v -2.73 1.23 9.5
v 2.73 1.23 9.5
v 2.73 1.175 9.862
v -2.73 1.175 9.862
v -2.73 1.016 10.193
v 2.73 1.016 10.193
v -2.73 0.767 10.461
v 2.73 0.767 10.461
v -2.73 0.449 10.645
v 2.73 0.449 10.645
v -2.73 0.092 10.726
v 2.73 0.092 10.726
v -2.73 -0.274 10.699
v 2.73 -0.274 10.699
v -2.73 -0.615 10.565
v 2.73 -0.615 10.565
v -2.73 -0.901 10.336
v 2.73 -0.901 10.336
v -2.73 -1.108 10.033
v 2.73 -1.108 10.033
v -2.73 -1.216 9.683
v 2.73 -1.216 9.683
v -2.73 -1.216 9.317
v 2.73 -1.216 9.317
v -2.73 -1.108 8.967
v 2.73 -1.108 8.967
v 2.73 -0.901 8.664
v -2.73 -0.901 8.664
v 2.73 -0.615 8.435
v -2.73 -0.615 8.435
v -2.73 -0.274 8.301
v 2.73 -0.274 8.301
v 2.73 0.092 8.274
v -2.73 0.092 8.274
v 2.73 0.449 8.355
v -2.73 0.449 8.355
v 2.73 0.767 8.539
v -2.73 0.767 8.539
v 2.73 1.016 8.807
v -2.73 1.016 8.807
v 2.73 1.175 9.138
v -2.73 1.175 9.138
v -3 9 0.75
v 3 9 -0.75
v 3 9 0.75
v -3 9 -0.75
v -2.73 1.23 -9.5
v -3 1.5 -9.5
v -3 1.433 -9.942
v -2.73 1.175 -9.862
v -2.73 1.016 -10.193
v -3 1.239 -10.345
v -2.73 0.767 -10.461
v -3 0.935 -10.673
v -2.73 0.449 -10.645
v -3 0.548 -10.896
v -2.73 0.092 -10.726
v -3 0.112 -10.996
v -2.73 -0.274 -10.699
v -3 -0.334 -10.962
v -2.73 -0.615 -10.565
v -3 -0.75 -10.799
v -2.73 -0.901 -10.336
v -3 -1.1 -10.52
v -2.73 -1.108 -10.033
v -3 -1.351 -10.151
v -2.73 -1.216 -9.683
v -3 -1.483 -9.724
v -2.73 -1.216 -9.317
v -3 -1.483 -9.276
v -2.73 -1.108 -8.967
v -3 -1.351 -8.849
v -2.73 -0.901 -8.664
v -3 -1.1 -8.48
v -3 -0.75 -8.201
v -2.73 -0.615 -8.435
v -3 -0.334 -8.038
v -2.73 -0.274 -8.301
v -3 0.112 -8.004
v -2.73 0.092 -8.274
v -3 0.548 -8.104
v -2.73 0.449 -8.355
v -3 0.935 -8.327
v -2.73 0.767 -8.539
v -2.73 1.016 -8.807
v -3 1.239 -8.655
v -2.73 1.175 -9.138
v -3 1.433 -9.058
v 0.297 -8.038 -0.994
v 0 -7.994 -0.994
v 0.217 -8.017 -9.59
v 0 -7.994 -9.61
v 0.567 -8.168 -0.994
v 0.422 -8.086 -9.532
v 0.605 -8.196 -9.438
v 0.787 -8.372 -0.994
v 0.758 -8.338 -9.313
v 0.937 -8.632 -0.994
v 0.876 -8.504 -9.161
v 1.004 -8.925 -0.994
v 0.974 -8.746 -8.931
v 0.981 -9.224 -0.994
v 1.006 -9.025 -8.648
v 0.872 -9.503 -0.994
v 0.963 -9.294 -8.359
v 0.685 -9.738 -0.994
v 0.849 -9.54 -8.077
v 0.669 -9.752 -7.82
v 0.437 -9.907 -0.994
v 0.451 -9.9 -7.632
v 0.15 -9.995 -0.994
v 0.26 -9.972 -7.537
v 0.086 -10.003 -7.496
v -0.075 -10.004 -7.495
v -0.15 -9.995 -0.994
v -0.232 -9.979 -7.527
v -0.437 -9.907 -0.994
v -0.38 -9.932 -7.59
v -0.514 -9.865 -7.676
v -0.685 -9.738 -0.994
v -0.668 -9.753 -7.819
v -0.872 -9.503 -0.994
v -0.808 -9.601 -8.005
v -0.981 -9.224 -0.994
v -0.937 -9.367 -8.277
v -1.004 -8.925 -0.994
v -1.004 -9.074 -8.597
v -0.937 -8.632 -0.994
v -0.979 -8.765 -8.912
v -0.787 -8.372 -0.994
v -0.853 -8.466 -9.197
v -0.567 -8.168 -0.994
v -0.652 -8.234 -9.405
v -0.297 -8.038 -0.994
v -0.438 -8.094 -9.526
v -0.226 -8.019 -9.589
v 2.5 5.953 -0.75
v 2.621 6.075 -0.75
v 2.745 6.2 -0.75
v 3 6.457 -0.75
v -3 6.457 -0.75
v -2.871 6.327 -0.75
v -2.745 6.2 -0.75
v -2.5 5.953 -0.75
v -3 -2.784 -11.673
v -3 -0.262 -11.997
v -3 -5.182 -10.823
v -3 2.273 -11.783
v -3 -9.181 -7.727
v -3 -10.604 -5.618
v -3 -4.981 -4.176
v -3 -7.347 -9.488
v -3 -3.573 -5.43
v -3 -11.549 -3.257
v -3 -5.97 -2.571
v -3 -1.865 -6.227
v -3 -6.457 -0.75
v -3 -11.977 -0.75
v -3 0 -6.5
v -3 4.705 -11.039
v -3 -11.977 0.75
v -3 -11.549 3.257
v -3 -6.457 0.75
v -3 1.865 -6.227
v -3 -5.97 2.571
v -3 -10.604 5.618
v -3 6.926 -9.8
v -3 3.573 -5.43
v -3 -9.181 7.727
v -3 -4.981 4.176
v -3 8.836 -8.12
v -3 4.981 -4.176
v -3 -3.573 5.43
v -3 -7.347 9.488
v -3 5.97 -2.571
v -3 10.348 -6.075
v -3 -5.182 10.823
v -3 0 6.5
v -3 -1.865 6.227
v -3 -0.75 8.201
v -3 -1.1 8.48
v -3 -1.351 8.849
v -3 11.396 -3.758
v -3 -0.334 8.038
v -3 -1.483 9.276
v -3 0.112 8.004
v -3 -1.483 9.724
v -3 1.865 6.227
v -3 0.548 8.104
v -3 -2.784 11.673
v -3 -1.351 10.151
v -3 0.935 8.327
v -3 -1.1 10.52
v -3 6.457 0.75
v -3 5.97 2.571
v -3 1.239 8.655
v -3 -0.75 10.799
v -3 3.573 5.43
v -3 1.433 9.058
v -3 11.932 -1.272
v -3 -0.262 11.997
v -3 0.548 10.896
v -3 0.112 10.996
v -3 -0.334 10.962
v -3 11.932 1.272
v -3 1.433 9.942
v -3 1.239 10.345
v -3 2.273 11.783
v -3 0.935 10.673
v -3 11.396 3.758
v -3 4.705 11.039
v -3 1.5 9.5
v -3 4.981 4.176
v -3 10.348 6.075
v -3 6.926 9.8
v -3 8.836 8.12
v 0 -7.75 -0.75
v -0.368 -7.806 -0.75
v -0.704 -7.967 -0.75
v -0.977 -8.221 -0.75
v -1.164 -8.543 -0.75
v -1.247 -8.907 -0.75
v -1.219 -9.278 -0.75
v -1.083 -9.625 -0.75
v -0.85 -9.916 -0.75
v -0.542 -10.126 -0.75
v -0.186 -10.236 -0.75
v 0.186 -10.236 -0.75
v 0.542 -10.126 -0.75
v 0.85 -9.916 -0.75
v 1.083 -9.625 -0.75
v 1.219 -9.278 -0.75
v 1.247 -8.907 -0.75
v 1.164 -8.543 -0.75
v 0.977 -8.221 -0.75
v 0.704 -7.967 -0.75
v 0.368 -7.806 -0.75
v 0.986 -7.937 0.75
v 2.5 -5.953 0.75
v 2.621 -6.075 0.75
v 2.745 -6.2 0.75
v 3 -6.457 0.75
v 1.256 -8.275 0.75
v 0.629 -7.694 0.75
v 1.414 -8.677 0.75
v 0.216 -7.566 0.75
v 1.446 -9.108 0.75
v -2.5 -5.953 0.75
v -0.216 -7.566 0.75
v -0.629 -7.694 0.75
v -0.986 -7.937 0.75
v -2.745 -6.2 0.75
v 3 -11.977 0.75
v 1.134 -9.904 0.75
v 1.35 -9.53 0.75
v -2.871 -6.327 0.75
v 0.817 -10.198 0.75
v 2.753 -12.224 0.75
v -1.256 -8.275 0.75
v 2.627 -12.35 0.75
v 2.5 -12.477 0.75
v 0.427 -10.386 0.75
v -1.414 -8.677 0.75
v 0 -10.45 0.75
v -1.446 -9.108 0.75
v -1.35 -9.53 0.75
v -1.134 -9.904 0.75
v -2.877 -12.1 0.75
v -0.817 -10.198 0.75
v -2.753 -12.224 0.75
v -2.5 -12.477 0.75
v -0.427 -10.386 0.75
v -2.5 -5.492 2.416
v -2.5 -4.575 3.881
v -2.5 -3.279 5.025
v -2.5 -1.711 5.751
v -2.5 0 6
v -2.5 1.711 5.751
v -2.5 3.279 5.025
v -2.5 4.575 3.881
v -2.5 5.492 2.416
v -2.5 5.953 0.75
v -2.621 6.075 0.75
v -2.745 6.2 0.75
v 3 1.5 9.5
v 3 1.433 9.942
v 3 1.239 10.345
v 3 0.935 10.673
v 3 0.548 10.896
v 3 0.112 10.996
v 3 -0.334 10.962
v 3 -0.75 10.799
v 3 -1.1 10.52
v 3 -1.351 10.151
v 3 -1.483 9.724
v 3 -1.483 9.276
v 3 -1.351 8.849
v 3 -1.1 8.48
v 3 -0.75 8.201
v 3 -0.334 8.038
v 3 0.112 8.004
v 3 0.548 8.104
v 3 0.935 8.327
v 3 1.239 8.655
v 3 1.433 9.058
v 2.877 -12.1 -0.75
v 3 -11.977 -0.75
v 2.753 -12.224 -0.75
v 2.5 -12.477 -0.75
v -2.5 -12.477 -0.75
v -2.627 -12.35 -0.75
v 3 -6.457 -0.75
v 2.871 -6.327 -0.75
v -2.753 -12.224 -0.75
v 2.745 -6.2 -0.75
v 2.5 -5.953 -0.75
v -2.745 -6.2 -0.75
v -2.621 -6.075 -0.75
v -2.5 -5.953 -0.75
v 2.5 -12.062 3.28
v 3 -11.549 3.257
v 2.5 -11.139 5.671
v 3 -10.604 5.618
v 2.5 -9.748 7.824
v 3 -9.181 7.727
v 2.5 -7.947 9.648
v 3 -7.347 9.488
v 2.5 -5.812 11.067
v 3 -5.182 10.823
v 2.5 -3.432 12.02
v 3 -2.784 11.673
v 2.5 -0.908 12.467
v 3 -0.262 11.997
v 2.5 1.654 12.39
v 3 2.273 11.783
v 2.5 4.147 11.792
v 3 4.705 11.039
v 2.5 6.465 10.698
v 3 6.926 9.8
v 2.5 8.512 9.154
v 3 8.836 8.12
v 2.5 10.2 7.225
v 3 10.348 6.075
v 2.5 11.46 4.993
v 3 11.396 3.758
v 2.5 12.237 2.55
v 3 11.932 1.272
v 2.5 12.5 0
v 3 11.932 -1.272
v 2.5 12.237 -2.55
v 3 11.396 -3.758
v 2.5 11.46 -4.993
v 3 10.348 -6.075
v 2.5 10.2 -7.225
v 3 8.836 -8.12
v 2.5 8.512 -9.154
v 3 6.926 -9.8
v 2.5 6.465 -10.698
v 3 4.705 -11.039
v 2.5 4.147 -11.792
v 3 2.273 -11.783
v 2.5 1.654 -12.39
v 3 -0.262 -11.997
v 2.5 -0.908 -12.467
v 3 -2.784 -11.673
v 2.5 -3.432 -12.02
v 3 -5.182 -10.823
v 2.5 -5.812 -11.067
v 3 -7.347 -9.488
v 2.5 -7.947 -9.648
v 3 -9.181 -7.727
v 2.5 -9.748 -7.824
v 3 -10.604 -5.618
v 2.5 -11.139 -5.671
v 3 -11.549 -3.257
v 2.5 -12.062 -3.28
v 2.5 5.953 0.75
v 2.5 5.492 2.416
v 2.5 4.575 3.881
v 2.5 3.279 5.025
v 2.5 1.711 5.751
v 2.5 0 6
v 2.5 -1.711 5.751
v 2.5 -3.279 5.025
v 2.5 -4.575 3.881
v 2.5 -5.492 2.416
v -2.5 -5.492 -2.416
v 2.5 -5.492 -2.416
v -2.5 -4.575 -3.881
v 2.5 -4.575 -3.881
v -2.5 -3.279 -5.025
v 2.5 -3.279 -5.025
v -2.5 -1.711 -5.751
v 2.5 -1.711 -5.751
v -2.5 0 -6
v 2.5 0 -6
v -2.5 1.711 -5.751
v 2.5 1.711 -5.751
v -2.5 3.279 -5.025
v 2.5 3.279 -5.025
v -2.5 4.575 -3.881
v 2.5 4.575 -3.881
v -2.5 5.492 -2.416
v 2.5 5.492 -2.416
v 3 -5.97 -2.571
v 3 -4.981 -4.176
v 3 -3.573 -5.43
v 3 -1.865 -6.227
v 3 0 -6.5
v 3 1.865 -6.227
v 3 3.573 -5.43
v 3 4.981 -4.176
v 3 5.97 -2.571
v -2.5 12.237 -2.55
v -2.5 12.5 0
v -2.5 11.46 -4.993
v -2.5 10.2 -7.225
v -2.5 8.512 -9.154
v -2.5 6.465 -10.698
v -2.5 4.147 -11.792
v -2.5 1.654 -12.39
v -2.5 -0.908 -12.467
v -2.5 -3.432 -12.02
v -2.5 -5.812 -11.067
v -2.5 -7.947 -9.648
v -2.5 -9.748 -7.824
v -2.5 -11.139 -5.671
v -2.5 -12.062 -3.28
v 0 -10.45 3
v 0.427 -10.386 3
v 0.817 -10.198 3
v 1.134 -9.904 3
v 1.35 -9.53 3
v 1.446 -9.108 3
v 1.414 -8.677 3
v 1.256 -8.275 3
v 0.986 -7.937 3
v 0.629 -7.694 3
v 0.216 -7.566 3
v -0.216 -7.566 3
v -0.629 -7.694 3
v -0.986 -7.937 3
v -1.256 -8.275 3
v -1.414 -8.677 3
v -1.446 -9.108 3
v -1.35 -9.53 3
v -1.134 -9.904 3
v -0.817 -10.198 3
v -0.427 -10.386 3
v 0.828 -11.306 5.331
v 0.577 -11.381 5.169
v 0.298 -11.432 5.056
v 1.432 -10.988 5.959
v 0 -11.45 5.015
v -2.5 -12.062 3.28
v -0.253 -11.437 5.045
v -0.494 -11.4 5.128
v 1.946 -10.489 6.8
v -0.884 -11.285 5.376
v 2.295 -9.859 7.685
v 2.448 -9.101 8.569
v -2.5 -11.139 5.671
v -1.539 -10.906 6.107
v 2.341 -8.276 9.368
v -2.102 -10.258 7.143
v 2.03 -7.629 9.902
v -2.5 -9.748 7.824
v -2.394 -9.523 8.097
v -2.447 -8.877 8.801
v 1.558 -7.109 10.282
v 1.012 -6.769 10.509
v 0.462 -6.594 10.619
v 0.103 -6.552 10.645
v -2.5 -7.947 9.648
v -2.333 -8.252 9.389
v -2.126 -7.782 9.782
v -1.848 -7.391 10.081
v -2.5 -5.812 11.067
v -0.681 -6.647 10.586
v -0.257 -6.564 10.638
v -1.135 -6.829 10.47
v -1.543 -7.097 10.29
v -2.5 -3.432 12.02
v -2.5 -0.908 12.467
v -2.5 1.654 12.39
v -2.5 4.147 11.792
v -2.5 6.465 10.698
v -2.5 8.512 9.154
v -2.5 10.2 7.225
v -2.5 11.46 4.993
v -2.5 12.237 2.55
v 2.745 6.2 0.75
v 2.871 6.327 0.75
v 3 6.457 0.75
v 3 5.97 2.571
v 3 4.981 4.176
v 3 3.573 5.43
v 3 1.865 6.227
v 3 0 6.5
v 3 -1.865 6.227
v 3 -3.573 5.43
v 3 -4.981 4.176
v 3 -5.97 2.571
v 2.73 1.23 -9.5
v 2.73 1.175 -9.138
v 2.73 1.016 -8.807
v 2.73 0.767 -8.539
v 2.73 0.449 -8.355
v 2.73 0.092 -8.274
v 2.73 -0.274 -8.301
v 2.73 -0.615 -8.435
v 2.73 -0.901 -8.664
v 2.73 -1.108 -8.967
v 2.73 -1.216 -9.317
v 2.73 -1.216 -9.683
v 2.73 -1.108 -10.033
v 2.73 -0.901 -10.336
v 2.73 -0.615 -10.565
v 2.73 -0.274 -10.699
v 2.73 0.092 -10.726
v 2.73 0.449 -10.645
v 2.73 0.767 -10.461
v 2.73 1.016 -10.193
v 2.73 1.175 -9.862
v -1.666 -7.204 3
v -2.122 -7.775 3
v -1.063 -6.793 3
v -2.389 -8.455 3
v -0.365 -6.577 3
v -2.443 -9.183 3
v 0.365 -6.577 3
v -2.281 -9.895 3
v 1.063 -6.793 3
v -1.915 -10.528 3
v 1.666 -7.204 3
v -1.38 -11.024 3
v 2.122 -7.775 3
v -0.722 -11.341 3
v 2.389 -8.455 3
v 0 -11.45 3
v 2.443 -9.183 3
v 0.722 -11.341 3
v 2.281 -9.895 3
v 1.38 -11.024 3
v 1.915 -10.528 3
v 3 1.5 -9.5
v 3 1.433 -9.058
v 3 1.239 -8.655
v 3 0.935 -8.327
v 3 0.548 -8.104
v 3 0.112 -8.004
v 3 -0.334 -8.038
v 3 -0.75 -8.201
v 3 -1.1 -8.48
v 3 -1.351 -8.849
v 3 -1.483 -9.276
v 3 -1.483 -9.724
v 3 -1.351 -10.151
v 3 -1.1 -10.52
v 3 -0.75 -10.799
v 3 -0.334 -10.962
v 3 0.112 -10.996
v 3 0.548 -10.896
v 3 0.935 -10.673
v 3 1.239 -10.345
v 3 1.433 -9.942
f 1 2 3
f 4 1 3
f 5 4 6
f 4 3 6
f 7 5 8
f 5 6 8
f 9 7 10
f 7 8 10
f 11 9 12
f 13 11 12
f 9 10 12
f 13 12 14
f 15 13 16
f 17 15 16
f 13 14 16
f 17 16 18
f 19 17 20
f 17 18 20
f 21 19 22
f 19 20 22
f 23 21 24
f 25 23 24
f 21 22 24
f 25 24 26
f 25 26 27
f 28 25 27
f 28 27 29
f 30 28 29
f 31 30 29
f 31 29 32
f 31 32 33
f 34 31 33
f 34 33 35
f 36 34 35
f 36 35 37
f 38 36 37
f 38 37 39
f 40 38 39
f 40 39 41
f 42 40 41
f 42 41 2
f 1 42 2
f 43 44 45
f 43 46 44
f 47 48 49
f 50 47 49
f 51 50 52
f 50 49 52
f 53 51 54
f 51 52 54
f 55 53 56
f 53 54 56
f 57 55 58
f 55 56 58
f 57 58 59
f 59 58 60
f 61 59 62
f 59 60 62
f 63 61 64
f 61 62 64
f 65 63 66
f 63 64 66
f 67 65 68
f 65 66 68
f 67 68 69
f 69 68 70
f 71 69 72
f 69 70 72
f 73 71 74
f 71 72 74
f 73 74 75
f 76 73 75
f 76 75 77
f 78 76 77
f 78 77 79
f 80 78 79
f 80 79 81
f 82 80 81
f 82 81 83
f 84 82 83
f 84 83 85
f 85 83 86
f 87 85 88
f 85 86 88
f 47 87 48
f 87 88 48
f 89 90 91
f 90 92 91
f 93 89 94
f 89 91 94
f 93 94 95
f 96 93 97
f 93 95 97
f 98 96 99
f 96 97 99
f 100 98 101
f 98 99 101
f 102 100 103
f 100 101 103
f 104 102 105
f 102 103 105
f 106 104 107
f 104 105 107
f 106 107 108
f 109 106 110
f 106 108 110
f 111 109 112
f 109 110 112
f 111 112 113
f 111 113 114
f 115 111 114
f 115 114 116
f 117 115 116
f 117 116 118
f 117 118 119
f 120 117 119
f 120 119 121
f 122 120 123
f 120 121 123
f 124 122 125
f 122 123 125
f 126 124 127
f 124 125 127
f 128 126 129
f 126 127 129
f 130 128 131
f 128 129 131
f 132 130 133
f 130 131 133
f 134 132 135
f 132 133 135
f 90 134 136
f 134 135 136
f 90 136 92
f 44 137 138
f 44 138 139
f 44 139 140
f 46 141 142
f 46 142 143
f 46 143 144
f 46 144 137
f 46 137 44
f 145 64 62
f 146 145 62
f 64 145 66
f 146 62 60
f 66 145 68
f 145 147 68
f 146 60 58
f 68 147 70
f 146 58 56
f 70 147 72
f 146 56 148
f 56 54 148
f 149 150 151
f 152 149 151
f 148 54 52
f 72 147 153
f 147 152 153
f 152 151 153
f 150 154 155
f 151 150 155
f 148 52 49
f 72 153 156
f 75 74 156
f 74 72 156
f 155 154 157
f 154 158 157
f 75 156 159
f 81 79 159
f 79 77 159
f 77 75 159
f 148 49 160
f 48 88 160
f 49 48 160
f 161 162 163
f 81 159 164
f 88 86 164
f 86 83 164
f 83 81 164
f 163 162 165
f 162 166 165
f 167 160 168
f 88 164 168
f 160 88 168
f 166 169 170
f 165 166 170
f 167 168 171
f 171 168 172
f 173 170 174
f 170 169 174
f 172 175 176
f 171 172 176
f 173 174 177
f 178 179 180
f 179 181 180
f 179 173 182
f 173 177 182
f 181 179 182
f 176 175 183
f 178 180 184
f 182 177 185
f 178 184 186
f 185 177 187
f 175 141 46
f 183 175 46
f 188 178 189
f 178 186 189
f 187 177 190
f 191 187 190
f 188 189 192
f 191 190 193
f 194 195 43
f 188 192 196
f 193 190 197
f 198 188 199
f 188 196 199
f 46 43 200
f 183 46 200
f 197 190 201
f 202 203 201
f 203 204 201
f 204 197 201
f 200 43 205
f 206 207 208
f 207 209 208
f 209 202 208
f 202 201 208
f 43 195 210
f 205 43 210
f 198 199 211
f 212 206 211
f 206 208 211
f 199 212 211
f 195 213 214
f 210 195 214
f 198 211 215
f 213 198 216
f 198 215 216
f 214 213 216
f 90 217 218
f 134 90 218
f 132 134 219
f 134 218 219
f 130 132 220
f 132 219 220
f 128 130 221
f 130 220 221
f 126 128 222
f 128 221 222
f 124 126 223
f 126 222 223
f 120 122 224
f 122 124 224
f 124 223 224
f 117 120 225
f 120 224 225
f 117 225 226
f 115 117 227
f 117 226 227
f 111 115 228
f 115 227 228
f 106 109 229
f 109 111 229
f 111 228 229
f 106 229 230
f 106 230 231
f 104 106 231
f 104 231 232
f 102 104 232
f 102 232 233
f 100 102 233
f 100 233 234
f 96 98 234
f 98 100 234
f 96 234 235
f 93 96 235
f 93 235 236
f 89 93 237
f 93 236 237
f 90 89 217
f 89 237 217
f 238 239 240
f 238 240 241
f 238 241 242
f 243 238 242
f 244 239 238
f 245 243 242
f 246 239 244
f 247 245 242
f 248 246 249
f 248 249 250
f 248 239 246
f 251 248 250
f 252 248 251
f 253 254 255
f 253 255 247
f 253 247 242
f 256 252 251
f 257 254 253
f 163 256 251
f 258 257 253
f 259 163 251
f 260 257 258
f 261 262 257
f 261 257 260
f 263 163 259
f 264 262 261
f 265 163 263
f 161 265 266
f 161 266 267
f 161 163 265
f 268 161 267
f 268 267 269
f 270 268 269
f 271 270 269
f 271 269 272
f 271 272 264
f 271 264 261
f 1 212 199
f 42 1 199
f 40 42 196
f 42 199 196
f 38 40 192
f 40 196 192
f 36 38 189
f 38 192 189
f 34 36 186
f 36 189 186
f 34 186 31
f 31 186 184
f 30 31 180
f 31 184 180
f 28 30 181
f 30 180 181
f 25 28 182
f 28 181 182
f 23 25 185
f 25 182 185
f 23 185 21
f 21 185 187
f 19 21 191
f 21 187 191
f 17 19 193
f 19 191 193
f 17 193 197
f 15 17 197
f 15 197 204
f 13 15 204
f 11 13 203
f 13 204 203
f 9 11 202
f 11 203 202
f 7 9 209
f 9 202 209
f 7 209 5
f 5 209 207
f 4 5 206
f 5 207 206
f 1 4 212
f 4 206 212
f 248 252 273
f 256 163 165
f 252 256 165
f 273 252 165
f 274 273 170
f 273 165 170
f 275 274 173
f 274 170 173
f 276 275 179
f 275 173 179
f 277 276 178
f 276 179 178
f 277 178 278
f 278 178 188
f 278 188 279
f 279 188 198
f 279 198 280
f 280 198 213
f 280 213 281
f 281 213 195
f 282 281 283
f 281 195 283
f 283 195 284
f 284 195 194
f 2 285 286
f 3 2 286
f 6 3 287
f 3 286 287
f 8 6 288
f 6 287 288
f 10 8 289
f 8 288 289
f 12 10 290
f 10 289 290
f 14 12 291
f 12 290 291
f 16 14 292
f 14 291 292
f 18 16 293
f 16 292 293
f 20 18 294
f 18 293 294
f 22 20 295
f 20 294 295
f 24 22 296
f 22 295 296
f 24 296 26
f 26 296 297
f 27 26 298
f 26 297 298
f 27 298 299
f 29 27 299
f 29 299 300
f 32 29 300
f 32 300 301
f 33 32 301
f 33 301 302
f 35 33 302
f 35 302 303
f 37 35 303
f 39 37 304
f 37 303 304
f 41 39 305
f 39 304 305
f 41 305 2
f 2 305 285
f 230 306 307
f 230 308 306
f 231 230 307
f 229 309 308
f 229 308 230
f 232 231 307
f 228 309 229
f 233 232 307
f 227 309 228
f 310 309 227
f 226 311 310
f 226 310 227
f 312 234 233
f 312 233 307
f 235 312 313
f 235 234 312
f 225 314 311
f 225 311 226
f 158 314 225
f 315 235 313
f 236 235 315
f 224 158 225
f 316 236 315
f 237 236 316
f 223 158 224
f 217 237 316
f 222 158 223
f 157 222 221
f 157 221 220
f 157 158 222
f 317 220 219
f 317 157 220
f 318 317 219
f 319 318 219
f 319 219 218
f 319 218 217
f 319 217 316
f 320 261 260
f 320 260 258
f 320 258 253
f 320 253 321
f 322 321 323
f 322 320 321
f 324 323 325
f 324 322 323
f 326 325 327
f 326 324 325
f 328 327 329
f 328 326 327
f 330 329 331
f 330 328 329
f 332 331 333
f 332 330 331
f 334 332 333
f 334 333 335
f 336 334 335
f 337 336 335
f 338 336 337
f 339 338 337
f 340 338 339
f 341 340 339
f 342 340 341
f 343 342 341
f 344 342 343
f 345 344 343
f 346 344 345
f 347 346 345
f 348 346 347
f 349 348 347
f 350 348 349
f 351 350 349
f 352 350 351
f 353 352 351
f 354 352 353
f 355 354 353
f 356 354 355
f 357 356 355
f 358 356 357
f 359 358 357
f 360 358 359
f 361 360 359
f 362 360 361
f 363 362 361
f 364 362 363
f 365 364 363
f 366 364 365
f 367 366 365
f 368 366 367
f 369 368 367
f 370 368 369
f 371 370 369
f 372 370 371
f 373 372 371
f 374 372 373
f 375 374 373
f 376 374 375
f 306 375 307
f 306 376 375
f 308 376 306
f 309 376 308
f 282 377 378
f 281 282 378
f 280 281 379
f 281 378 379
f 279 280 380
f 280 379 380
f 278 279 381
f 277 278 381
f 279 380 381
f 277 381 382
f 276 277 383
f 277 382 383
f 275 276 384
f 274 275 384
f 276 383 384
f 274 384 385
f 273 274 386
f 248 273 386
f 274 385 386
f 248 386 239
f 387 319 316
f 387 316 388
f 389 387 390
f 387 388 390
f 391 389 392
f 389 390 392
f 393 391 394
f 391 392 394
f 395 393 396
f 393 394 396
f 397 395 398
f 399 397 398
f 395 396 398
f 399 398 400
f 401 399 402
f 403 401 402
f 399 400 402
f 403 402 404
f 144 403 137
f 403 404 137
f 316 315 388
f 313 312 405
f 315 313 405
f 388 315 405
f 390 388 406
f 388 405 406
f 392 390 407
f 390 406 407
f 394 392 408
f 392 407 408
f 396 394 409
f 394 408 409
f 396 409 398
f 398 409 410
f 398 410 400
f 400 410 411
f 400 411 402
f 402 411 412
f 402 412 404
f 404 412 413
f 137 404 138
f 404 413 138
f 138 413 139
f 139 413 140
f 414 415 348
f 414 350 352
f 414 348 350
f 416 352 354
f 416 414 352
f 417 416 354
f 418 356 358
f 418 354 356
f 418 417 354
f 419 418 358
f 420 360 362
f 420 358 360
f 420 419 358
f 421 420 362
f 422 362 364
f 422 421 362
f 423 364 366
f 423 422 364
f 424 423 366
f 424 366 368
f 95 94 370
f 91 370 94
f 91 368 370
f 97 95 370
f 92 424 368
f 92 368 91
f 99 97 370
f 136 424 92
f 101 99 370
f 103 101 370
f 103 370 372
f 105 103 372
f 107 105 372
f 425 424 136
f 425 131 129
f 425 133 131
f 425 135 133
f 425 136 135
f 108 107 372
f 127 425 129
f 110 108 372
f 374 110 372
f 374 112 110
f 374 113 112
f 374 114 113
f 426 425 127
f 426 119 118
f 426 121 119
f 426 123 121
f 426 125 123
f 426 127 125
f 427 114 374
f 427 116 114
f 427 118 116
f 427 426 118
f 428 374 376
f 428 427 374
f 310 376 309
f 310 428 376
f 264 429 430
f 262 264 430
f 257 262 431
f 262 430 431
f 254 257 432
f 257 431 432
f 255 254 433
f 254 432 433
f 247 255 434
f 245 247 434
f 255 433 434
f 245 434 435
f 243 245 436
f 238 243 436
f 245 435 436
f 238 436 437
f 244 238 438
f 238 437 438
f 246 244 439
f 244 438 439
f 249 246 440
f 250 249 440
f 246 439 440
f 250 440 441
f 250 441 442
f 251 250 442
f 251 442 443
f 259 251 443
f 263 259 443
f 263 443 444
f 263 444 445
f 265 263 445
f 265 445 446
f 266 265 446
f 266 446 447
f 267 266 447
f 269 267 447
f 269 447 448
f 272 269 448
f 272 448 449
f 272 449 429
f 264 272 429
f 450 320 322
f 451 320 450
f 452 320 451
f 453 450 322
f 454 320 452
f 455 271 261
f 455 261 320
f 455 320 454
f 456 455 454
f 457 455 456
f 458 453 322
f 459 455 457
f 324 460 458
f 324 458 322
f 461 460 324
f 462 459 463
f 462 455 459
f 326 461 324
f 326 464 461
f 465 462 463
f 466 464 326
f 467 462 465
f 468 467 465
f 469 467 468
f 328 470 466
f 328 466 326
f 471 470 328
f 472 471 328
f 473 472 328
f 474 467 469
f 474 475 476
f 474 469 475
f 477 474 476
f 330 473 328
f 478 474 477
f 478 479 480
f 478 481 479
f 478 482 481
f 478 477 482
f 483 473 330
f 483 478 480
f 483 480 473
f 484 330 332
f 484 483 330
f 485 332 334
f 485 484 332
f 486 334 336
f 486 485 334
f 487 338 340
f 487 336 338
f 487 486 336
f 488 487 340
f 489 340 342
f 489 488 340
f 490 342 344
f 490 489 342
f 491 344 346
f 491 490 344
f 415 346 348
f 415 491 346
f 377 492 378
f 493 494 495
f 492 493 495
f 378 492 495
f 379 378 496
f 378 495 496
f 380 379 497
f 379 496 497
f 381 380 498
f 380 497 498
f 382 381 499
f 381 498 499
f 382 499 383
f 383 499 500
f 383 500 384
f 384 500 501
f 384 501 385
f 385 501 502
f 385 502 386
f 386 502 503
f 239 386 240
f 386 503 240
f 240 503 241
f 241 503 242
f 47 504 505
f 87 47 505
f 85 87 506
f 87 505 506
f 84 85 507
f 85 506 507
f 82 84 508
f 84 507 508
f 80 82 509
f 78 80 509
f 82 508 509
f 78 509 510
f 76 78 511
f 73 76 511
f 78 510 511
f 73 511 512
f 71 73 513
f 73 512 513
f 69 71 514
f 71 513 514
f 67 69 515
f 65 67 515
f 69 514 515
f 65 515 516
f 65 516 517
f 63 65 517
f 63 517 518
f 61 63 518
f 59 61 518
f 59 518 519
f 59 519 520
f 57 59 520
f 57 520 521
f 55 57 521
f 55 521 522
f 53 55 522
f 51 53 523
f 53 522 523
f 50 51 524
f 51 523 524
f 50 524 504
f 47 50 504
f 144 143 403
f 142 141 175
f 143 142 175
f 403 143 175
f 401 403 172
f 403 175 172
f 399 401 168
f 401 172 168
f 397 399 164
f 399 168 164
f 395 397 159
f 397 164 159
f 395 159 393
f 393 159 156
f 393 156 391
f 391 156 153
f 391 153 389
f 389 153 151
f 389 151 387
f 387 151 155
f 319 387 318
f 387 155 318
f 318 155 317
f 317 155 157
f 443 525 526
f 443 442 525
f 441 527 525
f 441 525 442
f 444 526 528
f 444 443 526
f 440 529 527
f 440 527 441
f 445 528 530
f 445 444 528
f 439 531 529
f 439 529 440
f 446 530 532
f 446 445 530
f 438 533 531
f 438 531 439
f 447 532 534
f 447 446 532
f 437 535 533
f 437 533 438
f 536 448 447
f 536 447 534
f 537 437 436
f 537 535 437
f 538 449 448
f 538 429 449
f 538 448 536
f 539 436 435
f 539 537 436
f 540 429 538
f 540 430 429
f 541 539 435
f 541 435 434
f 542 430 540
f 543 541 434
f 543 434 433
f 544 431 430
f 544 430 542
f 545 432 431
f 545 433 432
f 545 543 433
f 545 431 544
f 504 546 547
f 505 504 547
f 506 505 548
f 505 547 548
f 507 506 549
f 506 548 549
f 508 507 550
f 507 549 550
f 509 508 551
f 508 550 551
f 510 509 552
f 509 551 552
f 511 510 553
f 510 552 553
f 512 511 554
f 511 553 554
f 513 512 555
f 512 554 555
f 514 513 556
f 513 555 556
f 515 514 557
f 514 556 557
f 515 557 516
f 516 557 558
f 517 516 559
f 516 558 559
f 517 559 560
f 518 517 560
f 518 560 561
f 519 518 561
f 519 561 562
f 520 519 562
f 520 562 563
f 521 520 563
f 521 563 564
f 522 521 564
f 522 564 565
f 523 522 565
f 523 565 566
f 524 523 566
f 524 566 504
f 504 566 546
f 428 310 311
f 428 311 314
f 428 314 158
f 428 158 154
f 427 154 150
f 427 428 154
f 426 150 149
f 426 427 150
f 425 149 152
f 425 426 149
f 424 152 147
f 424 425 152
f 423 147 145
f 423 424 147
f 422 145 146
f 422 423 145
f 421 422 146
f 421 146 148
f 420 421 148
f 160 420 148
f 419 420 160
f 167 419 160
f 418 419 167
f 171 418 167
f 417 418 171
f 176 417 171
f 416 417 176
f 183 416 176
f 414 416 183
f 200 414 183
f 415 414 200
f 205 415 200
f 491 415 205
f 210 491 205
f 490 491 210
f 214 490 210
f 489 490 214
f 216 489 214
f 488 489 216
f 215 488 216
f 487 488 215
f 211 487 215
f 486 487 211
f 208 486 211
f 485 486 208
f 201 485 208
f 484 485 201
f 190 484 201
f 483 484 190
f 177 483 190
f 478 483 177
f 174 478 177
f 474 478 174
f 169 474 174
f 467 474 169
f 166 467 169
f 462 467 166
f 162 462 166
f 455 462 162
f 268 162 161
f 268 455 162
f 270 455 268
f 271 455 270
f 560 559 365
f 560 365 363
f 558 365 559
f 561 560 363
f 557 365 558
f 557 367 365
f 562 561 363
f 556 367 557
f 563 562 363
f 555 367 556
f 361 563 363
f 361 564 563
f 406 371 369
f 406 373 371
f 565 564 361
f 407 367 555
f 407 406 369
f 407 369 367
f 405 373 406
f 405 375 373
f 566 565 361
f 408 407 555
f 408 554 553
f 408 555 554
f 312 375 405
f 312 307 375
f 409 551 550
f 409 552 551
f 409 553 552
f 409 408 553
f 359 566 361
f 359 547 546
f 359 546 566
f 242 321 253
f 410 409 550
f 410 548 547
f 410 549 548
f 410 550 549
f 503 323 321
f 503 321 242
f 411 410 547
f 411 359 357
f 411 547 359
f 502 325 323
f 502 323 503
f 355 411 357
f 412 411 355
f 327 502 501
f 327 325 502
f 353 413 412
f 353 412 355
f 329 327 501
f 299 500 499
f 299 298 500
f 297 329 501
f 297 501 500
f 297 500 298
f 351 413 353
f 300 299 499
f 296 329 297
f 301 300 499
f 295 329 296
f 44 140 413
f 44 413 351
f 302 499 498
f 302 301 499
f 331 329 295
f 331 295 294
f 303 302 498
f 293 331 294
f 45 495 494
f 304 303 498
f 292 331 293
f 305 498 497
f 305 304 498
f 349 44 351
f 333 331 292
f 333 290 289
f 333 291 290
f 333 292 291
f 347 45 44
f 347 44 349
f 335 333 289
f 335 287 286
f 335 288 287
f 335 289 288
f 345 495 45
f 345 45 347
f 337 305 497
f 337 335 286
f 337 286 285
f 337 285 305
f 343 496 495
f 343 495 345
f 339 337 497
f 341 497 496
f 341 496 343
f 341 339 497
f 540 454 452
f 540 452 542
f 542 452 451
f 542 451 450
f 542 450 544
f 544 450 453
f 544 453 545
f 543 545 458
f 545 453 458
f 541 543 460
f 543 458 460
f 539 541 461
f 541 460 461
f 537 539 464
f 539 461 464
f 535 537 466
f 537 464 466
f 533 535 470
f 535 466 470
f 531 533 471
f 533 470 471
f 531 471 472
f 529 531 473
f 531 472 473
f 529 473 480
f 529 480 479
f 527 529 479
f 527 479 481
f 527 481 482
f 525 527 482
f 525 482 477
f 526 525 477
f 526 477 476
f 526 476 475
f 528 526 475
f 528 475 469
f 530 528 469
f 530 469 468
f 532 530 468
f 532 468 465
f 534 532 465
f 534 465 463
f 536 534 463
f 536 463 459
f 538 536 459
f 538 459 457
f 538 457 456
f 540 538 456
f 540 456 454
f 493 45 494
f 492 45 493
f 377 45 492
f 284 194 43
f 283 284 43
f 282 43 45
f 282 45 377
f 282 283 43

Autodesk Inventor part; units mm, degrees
sketch "Sketch_1" plane through (0, 0, 0) normal (0, 0, 1) x (1, 0, 0)
  line L0 (3, 0) -> (-3, 0)
  line L1 (-3, 12) -> (-3, 6.5)
  line L2 (-3, 6.5) -> (-2.5, 6)
  line L3 (-2.5, 6) -> (2.5, 6)
  line L4 (2.5, 6) -> (3, 6.5)
  line L5 (3, 6.5) -> (3, 12)
  line L6 (3, 12) -> (2.5, 12.5)
  line L7 (2.5, 12.5) -> (-2.5, 12.5)
  line L8 (-2.5, 12.5) -> (-3, 12)
revolve "Revolution1" add sketch "Sketch_1" angle 360 about axis through (3, 0, 0) along (1, 0, 0)
sketch "Sketch_2" plane through (0, 0, 0) normal (1, 0, 0) x (0, 1, 0)
  line L0 (-12.5, 0.75) -> (-12.5, -0.75)
  line L1 (-12.5, -0.75) -> (9, -0.75)
  line L2 (9, -0.75) -> (9, 0.75)
  line L3 (9, 0.75) -> (-12.5, 0.75)
extrude "Extrusion1" cut sketch "Sketch_2" along normal mid plane 6
sketch "Sketch_3" plane through (0, 0, 0) normal (1, 0, 0) x (0, 1, 0)
  line L0 (-9, 12.5) -> (-9, 0)
  line L1 (-9, 0) -> (-10.45, 0)
  line L2 (-10.45, 0) -> (-10.45, 3)
  line L3 (-10.45, 3) -> (-11.45, 3)
  line L4 (-11.45, 3) -> (-11.45, 12.5)
  line L5 (-11.45, 12.5) -> (-9, 12.5)
  line L6 (-9, 12.5) -> (-9, 0)
revolve "Revolution2" cut sketch "Sketch_3" angle 360 about axis through (0, -9, 12.5) along (0, 0, 1)
sketch "Sketch_4" plane through (0, 0, 0) normal (1, 0, 0) x (0, 1, 0)
  line L0 (-9, -14.25) -> (-9, -0.75)
  line L1 (-9, -0.75) -> (-7.75, -0.75)
  line L2 (-7.75, -0.75) -> (-7.9935, -0.9935)
  line L3 (-7.9935, -0.9935) -> (-7.9935, -14.25)
  line L4 (-7.9935, -14.25) -> (-9, -14.25)
  line L5 (-9, -14.25) -> (-9, -0.75)
revolve "Revolution3" cut sketch "Sketch_4" angle 360 about axis through (0, -9, -14.25) along (0, 0, -1)
thread "Thread1" size "M2.5x0.45" class "6H" standard "ISO Metric profile" length 8.814
sketch "Sketch_7" plane through (0, 0, -9.5) normal (0, 0, 1) x (1, 0, 0)
  line L0 (3, 0) -> (-3, 0)
  line L1 (-3, 0) -> (-3, 1.5)
  line L2 (-3, 1.5) -> (-2.7295, 1.2295)
  line L3 (-2.7295, 1.2295) -> (2.7295, 1.2295)
  line L4 (2.7295, 1.2295) -> (3, 1.5)
  line L5 (3, 1.5) -> (3, 0)
  line L6 (3, 0) -> (-3, 0)
revolve "Revolution4" cut sketch "Sketch_7" angle 360 about axis through (3, 0, -9.5) along (1, 0, 0)
thread "Thread2" size "M3x0.5" class "6H" standard "ISO Metric profile" full length
sketch "Sketch_8" plane through (0, 0, 9.5) normal (0, 0, 1) x (1, 0, 0)
  line L0 (3, 0) -> (-3, 0)
  line L1 (-3, 0) -> (-3, 1.5)
  line L2 (-3, 1.5) -> (-2.7295, 1.2295)
  line L3 (-2.7295, 1.2295) -> (2.7295, 1.2295)
  line L4 (2.7295, 1.2295) -> (3, 1.5)
  line L5 (3, 1.5) -> (3, 0)
  line L6 (3, 0) -> (-3, 0)
revolve "Revolution5" cut sketch "Sketch_8" angle 360 about axis through (3, 0, 9.5) along (1, 0, 0)
thread "Thread3" size "M3x0.5" class "6H" standard "ISO Metric profile" full length
ref_plane "body_screw_XY" through (0, -9, 3) normal (0, 0, 1) x (1, 0, 0)
ref_plane "body_screw_YZ" through (0, -9, 3) normal (1, 0, 0) x (0, 1, 0)
ref_plane "body_screw_ZX" through (0, -9, 3) normal (0, 1, 0) x (0, 0, 1)
properties part number "SCSWJ12-6_b"
